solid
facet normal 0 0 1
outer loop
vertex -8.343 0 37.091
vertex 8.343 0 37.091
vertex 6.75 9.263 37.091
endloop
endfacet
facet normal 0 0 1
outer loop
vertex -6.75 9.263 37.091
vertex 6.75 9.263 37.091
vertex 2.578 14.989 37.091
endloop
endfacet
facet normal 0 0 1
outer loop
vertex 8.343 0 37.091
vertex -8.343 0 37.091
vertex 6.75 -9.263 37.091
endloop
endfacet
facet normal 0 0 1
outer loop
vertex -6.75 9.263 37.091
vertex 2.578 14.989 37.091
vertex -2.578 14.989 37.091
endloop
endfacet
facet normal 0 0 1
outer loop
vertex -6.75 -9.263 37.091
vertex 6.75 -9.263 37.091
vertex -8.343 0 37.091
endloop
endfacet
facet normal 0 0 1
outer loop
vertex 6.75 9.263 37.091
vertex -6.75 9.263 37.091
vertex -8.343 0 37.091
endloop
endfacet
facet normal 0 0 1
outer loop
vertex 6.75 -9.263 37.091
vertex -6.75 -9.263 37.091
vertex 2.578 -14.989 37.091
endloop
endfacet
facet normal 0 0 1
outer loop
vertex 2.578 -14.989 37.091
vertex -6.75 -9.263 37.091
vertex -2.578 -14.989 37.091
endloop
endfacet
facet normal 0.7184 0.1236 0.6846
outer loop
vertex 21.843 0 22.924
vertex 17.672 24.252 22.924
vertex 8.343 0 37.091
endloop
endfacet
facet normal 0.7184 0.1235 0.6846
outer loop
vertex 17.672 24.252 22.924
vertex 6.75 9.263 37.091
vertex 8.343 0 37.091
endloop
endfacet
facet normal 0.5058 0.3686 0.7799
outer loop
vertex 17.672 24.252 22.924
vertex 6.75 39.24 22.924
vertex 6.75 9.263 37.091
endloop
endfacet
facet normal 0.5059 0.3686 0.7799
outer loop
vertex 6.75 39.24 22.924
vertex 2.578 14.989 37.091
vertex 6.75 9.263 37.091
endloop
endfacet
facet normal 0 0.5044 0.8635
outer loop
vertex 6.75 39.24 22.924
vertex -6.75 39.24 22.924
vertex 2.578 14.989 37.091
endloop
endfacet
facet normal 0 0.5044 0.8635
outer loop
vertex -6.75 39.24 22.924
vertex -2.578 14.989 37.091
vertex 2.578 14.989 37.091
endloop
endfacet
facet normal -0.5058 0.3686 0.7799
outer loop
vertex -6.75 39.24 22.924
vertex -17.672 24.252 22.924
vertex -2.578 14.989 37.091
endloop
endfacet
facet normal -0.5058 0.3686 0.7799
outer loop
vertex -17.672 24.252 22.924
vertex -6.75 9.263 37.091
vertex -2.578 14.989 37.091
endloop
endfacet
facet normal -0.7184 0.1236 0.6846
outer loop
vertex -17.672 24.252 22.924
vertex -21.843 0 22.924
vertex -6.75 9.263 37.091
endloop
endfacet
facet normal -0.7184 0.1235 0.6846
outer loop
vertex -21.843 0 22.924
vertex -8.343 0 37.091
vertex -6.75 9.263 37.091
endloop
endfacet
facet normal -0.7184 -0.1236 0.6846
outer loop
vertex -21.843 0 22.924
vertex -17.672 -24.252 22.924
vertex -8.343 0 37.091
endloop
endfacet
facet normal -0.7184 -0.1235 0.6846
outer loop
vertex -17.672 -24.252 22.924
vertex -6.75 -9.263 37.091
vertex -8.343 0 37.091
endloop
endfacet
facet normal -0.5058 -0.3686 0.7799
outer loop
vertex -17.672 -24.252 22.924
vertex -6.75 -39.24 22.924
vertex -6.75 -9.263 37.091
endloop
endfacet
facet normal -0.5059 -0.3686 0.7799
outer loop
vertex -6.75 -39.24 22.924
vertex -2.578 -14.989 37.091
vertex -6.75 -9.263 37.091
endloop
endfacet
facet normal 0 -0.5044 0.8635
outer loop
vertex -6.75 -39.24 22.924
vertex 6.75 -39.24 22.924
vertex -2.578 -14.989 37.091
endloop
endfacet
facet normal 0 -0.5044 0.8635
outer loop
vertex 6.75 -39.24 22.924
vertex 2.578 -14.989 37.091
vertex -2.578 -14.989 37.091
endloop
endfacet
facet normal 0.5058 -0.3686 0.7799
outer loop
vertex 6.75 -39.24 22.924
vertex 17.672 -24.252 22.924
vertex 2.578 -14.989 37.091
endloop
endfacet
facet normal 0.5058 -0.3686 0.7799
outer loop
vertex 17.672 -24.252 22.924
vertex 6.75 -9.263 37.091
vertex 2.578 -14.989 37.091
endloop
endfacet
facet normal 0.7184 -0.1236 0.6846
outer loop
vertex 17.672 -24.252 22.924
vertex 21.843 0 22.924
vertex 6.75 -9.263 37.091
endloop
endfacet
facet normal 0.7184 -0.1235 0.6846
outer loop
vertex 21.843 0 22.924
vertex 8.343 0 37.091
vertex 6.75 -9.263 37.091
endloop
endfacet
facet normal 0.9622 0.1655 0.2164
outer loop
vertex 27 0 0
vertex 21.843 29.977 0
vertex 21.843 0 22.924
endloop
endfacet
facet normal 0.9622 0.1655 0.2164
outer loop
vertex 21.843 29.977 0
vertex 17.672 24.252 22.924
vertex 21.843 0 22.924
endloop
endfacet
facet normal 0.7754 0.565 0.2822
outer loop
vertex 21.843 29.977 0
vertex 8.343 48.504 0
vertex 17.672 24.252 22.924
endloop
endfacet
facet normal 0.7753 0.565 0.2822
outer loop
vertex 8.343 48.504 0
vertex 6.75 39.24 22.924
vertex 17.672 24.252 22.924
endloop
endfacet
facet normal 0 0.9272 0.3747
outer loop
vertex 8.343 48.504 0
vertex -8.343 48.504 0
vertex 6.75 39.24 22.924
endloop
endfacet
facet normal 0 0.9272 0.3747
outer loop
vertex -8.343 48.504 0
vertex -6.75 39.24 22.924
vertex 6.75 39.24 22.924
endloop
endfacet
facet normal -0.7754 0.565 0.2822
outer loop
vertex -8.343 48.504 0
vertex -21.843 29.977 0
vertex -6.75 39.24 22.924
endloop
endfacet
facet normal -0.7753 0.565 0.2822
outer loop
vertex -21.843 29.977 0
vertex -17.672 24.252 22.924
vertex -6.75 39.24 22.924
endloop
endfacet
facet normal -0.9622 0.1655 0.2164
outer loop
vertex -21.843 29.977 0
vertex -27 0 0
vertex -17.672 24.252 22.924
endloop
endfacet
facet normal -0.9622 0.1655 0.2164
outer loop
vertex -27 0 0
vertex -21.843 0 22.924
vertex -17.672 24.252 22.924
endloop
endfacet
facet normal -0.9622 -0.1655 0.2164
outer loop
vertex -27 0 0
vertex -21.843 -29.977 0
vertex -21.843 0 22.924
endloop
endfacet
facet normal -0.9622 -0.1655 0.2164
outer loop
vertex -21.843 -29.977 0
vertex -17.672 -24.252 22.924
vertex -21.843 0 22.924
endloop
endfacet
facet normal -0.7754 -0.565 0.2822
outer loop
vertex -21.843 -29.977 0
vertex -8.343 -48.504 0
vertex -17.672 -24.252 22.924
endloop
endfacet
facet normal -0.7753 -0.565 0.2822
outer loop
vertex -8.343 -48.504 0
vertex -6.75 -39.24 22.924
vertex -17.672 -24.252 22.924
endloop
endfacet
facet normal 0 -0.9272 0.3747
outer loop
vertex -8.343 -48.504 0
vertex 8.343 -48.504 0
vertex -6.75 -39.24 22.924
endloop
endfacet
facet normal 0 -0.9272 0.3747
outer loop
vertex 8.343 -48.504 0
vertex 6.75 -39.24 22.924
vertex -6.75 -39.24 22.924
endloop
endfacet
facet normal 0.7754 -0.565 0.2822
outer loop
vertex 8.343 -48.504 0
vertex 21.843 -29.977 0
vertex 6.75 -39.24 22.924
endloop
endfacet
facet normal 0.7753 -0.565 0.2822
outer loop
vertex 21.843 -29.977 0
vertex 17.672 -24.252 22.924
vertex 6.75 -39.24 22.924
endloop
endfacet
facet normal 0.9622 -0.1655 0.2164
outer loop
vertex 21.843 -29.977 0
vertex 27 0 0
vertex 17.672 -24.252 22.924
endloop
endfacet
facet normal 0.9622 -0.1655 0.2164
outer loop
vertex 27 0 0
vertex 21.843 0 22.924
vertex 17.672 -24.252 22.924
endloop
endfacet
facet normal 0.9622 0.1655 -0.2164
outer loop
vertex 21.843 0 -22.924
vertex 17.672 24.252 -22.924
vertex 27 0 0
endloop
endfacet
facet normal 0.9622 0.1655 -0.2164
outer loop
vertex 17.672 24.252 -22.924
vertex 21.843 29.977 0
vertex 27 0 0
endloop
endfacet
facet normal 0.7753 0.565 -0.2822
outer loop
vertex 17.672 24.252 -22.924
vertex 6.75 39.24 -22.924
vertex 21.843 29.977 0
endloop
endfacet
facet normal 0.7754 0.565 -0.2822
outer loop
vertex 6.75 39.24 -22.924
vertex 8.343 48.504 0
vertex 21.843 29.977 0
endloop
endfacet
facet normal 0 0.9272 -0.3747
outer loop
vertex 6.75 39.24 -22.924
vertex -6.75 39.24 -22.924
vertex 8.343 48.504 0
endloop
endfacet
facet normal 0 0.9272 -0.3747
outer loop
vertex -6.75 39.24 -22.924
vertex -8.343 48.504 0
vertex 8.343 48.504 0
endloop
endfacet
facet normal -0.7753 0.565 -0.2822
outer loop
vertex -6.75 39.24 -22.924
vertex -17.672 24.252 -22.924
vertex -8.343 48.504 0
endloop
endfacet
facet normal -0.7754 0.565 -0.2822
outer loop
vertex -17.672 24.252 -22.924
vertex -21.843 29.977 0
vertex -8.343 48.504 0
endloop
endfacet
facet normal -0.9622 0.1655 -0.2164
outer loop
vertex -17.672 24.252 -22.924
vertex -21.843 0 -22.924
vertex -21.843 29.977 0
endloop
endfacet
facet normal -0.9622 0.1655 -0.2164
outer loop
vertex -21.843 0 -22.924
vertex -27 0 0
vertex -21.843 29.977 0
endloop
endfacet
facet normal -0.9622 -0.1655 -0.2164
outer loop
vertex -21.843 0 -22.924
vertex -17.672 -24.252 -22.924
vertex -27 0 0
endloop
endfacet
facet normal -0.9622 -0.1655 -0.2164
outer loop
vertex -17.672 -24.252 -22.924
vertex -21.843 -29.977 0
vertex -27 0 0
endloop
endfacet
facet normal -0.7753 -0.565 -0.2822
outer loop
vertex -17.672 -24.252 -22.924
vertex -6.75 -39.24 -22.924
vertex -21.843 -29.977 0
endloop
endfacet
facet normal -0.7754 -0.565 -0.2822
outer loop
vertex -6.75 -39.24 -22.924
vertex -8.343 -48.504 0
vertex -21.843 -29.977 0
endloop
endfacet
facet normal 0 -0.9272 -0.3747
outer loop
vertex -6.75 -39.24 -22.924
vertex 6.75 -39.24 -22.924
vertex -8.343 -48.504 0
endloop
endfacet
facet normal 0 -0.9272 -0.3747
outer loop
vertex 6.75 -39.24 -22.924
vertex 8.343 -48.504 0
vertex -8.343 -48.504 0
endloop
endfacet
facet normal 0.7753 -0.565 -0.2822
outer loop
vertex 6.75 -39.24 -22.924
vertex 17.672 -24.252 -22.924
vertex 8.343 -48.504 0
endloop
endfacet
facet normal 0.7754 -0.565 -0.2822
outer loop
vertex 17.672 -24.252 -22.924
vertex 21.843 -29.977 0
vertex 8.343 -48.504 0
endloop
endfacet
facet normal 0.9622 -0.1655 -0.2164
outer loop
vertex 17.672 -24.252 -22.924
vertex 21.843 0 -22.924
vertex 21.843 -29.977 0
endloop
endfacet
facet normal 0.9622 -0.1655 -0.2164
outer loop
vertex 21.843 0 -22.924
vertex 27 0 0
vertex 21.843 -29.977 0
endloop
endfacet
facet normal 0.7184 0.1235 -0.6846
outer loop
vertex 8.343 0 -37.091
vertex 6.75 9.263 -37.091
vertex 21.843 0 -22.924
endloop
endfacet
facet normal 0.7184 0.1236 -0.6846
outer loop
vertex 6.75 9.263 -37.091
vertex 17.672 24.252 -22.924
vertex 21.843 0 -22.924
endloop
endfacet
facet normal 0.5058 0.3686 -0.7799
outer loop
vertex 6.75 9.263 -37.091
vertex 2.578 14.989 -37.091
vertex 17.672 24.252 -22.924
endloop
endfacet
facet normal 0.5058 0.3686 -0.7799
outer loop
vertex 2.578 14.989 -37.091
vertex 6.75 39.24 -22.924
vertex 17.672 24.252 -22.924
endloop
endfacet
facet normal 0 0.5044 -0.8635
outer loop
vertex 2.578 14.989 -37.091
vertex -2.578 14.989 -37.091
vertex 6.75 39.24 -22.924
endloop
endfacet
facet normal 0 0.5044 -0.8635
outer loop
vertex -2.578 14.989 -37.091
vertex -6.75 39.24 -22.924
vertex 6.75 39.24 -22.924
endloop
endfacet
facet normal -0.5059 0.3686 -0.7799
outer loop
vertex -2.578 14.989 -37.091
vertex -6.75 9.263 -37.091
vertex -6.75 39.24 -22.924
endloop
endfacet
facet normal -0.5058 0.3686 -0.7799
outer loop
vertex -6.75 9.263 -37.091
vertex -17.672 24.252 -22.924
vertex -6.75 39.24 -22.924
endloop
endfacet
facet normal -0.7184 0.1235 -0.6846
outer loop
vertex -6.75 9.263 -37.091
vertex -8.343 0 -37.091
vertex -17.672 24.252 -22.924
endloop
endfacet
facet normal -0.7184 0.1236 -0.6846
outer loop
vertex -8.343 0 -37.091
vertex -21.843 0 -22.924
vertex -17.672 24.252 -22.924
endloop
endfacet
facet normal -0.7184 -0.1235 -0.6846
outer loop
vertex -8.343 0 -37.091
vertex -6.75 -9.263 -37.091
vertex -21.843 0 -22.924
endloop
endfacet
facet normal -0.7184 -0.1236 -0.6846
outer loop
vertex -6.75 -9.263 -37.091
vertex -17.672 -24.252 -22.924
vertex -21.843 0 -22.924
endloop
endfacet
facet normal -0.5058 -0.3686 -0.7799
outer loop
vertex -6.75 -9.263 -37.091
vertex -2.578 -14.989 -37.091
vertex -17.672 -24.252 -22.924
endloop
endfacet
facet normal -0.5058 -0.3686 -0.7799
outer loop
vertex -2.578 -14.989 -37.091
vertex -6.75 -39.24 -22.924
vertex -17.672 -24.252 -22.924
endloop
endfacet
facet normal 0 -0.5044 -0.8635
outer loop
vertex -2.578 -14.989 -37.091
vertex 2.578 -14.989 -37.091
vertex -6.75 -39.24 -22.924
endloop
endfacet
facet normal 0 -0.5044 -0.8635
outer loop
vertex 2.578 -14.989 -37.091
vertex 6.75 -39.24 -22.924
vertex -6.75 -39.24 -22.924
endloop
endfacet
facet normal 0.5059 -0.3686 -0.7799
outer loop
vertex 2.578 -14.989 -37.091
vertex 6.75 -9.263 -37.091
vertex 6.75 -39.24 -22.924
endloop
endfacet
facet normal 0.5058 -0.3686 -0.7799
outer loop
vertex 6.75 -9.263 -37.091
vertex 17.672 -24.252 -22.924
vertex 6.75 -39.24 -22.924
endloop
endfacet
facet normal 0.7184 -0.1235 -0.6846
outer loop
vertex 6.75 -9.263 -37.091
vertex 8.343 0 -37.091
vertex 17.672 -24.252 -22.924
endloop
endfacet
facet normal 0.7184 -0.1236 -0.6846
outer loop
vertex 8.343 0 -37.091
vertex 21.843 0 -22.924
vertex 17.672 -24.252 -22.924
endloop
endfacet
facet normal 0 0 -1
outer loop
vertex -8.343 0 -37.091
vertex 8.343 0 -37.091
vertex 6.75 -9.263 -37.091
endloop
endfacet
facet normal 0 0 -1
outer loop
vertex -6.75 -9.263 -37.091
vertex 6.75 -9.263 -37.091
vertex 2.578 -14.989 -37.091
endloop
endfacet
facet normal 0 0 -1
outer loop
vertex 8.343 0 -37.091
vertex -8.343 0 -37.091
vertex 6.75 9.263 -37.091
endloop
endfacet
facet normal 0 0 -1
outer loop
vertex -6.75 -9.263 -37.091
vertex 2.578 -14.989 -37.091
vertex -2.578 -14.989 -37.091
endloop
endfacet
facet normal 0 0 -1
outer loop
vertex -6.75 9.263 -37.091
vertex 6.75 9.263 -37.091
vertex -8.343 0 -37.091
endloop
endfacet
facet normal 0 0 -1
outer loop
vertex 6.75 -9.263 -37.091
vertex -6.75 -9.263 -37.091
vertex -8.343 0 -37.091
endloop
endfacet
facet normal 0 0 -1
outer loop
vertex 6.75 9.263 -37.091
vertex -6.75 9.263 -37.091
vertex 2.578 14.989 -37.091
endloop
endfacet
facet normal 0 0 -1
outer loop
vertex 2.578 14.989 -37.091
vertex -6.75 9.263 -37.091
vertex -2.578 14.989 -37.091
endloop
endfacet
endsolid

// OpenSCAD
// Generated by SolidPython 1.0.1 on 2020-07-29 00:46:49


scale(v = [9, 17, 13]) {
	sphere(r = 3);
}
/***********************************************
*********      SolidPython code:      **********
************************************************
 
# import packages: SolidPython
from solid import *
from solid.utils import *
from itertools import chain, combinations, permutations


class Resize:

    def __init__(self, scad_file):
        self.scad_file = scad_file
        #self.scad_file = import_scad(scad_file)
        # cone/cylinder param:
        self.r1 = 0
        self.r2 = 0
        self.h = 0
        # rectangular prism param:
        self.w = 0
        self.l = 0
        # ellipse param:
        self.r = 0

    # import OpenScad code (file name corresponds to shape)


    # classify shape + parameters
    def assign(self, param1, param2, param3):
        if self.scad_file == 'cone.scad':
            self.r1 = param1
            self.r2 = param2
            self.h = param3
        elif self.scad_file == 'cylinder.scad':
            self.r1 = param1
            self.r2 = param2
            self.h = param3
        elif self.scad_file == 'rectangularPrism.scad':
            self.h = param1
            self.l = param2
            self.w = param3
        else:
            self.r = param1
            self.h = param2

    # resize parameters
    def iterate(self):
        x = range(3, 20, 2)
        i = 1
        if self.scad_file == 'cone.scad':
            tempList = list(permutations(x, 2))
            for temp in tempList:
                param1 = temp[0]
                param2 = temp[1]
                filepath = 'produced_scad_files/' + 'cone' + str(param1) + '_' + str(param2) + '_' + '.scad'
                scad_render_to_file(cylinder(h=param1, r1=param2, r2=0), filepath)

        elif self.scad_file == 'cylinder.scad':
            tempList = list(permutations(x, 3))
            for temp in tempList:
                param1 = temp[0]
                param2 = temp[1]
                filepath = 'produced_scad_files/' + 'cylinder' + str(param1) + '_' + str(param2) + '_' + '.scad'
                scad_render_to_file(cylinder(h=param1, r1=param2, r2=param2), filepath)

        elif self.scad_file == 'rectangularPrism.scad':
            tempList = list(permutations(x, 3))
            for temp in tempList:
                param1 = temp[0]
                param2 = temp[1]
                param3 = temp[2]
                filepath = 'produced_scad_files/' + 'rectangularPrism' + str(param1) + '_' + str(param2) + '_' + str(
                    param3) + '.scad'
                scad_render_to_file(cube(size=(param1, param2, param3)), filepath)

        elif self.scad_file == 'ellipse.scad':
            tempList = list(permutations(x, 4))
            for temp in tempList:
                param1 = temp[0]
                param2 = temp[1]
                param3 = temp[2]
                param4 = temp[3]
                filepath = 'produced_scad_files/' + 'ellipse' + str(param1) + '_' + str(param2) + '_' + str(param3) + '_' + str(param4) + '.scad'
                scad_render_to_file(scale([param1, param2, param3])(sphere(r=param4)), filepath)

    def render_to_scadfile(self):
        scad_render_to_file(scad, 'example.scad') 
 
************************************************/
